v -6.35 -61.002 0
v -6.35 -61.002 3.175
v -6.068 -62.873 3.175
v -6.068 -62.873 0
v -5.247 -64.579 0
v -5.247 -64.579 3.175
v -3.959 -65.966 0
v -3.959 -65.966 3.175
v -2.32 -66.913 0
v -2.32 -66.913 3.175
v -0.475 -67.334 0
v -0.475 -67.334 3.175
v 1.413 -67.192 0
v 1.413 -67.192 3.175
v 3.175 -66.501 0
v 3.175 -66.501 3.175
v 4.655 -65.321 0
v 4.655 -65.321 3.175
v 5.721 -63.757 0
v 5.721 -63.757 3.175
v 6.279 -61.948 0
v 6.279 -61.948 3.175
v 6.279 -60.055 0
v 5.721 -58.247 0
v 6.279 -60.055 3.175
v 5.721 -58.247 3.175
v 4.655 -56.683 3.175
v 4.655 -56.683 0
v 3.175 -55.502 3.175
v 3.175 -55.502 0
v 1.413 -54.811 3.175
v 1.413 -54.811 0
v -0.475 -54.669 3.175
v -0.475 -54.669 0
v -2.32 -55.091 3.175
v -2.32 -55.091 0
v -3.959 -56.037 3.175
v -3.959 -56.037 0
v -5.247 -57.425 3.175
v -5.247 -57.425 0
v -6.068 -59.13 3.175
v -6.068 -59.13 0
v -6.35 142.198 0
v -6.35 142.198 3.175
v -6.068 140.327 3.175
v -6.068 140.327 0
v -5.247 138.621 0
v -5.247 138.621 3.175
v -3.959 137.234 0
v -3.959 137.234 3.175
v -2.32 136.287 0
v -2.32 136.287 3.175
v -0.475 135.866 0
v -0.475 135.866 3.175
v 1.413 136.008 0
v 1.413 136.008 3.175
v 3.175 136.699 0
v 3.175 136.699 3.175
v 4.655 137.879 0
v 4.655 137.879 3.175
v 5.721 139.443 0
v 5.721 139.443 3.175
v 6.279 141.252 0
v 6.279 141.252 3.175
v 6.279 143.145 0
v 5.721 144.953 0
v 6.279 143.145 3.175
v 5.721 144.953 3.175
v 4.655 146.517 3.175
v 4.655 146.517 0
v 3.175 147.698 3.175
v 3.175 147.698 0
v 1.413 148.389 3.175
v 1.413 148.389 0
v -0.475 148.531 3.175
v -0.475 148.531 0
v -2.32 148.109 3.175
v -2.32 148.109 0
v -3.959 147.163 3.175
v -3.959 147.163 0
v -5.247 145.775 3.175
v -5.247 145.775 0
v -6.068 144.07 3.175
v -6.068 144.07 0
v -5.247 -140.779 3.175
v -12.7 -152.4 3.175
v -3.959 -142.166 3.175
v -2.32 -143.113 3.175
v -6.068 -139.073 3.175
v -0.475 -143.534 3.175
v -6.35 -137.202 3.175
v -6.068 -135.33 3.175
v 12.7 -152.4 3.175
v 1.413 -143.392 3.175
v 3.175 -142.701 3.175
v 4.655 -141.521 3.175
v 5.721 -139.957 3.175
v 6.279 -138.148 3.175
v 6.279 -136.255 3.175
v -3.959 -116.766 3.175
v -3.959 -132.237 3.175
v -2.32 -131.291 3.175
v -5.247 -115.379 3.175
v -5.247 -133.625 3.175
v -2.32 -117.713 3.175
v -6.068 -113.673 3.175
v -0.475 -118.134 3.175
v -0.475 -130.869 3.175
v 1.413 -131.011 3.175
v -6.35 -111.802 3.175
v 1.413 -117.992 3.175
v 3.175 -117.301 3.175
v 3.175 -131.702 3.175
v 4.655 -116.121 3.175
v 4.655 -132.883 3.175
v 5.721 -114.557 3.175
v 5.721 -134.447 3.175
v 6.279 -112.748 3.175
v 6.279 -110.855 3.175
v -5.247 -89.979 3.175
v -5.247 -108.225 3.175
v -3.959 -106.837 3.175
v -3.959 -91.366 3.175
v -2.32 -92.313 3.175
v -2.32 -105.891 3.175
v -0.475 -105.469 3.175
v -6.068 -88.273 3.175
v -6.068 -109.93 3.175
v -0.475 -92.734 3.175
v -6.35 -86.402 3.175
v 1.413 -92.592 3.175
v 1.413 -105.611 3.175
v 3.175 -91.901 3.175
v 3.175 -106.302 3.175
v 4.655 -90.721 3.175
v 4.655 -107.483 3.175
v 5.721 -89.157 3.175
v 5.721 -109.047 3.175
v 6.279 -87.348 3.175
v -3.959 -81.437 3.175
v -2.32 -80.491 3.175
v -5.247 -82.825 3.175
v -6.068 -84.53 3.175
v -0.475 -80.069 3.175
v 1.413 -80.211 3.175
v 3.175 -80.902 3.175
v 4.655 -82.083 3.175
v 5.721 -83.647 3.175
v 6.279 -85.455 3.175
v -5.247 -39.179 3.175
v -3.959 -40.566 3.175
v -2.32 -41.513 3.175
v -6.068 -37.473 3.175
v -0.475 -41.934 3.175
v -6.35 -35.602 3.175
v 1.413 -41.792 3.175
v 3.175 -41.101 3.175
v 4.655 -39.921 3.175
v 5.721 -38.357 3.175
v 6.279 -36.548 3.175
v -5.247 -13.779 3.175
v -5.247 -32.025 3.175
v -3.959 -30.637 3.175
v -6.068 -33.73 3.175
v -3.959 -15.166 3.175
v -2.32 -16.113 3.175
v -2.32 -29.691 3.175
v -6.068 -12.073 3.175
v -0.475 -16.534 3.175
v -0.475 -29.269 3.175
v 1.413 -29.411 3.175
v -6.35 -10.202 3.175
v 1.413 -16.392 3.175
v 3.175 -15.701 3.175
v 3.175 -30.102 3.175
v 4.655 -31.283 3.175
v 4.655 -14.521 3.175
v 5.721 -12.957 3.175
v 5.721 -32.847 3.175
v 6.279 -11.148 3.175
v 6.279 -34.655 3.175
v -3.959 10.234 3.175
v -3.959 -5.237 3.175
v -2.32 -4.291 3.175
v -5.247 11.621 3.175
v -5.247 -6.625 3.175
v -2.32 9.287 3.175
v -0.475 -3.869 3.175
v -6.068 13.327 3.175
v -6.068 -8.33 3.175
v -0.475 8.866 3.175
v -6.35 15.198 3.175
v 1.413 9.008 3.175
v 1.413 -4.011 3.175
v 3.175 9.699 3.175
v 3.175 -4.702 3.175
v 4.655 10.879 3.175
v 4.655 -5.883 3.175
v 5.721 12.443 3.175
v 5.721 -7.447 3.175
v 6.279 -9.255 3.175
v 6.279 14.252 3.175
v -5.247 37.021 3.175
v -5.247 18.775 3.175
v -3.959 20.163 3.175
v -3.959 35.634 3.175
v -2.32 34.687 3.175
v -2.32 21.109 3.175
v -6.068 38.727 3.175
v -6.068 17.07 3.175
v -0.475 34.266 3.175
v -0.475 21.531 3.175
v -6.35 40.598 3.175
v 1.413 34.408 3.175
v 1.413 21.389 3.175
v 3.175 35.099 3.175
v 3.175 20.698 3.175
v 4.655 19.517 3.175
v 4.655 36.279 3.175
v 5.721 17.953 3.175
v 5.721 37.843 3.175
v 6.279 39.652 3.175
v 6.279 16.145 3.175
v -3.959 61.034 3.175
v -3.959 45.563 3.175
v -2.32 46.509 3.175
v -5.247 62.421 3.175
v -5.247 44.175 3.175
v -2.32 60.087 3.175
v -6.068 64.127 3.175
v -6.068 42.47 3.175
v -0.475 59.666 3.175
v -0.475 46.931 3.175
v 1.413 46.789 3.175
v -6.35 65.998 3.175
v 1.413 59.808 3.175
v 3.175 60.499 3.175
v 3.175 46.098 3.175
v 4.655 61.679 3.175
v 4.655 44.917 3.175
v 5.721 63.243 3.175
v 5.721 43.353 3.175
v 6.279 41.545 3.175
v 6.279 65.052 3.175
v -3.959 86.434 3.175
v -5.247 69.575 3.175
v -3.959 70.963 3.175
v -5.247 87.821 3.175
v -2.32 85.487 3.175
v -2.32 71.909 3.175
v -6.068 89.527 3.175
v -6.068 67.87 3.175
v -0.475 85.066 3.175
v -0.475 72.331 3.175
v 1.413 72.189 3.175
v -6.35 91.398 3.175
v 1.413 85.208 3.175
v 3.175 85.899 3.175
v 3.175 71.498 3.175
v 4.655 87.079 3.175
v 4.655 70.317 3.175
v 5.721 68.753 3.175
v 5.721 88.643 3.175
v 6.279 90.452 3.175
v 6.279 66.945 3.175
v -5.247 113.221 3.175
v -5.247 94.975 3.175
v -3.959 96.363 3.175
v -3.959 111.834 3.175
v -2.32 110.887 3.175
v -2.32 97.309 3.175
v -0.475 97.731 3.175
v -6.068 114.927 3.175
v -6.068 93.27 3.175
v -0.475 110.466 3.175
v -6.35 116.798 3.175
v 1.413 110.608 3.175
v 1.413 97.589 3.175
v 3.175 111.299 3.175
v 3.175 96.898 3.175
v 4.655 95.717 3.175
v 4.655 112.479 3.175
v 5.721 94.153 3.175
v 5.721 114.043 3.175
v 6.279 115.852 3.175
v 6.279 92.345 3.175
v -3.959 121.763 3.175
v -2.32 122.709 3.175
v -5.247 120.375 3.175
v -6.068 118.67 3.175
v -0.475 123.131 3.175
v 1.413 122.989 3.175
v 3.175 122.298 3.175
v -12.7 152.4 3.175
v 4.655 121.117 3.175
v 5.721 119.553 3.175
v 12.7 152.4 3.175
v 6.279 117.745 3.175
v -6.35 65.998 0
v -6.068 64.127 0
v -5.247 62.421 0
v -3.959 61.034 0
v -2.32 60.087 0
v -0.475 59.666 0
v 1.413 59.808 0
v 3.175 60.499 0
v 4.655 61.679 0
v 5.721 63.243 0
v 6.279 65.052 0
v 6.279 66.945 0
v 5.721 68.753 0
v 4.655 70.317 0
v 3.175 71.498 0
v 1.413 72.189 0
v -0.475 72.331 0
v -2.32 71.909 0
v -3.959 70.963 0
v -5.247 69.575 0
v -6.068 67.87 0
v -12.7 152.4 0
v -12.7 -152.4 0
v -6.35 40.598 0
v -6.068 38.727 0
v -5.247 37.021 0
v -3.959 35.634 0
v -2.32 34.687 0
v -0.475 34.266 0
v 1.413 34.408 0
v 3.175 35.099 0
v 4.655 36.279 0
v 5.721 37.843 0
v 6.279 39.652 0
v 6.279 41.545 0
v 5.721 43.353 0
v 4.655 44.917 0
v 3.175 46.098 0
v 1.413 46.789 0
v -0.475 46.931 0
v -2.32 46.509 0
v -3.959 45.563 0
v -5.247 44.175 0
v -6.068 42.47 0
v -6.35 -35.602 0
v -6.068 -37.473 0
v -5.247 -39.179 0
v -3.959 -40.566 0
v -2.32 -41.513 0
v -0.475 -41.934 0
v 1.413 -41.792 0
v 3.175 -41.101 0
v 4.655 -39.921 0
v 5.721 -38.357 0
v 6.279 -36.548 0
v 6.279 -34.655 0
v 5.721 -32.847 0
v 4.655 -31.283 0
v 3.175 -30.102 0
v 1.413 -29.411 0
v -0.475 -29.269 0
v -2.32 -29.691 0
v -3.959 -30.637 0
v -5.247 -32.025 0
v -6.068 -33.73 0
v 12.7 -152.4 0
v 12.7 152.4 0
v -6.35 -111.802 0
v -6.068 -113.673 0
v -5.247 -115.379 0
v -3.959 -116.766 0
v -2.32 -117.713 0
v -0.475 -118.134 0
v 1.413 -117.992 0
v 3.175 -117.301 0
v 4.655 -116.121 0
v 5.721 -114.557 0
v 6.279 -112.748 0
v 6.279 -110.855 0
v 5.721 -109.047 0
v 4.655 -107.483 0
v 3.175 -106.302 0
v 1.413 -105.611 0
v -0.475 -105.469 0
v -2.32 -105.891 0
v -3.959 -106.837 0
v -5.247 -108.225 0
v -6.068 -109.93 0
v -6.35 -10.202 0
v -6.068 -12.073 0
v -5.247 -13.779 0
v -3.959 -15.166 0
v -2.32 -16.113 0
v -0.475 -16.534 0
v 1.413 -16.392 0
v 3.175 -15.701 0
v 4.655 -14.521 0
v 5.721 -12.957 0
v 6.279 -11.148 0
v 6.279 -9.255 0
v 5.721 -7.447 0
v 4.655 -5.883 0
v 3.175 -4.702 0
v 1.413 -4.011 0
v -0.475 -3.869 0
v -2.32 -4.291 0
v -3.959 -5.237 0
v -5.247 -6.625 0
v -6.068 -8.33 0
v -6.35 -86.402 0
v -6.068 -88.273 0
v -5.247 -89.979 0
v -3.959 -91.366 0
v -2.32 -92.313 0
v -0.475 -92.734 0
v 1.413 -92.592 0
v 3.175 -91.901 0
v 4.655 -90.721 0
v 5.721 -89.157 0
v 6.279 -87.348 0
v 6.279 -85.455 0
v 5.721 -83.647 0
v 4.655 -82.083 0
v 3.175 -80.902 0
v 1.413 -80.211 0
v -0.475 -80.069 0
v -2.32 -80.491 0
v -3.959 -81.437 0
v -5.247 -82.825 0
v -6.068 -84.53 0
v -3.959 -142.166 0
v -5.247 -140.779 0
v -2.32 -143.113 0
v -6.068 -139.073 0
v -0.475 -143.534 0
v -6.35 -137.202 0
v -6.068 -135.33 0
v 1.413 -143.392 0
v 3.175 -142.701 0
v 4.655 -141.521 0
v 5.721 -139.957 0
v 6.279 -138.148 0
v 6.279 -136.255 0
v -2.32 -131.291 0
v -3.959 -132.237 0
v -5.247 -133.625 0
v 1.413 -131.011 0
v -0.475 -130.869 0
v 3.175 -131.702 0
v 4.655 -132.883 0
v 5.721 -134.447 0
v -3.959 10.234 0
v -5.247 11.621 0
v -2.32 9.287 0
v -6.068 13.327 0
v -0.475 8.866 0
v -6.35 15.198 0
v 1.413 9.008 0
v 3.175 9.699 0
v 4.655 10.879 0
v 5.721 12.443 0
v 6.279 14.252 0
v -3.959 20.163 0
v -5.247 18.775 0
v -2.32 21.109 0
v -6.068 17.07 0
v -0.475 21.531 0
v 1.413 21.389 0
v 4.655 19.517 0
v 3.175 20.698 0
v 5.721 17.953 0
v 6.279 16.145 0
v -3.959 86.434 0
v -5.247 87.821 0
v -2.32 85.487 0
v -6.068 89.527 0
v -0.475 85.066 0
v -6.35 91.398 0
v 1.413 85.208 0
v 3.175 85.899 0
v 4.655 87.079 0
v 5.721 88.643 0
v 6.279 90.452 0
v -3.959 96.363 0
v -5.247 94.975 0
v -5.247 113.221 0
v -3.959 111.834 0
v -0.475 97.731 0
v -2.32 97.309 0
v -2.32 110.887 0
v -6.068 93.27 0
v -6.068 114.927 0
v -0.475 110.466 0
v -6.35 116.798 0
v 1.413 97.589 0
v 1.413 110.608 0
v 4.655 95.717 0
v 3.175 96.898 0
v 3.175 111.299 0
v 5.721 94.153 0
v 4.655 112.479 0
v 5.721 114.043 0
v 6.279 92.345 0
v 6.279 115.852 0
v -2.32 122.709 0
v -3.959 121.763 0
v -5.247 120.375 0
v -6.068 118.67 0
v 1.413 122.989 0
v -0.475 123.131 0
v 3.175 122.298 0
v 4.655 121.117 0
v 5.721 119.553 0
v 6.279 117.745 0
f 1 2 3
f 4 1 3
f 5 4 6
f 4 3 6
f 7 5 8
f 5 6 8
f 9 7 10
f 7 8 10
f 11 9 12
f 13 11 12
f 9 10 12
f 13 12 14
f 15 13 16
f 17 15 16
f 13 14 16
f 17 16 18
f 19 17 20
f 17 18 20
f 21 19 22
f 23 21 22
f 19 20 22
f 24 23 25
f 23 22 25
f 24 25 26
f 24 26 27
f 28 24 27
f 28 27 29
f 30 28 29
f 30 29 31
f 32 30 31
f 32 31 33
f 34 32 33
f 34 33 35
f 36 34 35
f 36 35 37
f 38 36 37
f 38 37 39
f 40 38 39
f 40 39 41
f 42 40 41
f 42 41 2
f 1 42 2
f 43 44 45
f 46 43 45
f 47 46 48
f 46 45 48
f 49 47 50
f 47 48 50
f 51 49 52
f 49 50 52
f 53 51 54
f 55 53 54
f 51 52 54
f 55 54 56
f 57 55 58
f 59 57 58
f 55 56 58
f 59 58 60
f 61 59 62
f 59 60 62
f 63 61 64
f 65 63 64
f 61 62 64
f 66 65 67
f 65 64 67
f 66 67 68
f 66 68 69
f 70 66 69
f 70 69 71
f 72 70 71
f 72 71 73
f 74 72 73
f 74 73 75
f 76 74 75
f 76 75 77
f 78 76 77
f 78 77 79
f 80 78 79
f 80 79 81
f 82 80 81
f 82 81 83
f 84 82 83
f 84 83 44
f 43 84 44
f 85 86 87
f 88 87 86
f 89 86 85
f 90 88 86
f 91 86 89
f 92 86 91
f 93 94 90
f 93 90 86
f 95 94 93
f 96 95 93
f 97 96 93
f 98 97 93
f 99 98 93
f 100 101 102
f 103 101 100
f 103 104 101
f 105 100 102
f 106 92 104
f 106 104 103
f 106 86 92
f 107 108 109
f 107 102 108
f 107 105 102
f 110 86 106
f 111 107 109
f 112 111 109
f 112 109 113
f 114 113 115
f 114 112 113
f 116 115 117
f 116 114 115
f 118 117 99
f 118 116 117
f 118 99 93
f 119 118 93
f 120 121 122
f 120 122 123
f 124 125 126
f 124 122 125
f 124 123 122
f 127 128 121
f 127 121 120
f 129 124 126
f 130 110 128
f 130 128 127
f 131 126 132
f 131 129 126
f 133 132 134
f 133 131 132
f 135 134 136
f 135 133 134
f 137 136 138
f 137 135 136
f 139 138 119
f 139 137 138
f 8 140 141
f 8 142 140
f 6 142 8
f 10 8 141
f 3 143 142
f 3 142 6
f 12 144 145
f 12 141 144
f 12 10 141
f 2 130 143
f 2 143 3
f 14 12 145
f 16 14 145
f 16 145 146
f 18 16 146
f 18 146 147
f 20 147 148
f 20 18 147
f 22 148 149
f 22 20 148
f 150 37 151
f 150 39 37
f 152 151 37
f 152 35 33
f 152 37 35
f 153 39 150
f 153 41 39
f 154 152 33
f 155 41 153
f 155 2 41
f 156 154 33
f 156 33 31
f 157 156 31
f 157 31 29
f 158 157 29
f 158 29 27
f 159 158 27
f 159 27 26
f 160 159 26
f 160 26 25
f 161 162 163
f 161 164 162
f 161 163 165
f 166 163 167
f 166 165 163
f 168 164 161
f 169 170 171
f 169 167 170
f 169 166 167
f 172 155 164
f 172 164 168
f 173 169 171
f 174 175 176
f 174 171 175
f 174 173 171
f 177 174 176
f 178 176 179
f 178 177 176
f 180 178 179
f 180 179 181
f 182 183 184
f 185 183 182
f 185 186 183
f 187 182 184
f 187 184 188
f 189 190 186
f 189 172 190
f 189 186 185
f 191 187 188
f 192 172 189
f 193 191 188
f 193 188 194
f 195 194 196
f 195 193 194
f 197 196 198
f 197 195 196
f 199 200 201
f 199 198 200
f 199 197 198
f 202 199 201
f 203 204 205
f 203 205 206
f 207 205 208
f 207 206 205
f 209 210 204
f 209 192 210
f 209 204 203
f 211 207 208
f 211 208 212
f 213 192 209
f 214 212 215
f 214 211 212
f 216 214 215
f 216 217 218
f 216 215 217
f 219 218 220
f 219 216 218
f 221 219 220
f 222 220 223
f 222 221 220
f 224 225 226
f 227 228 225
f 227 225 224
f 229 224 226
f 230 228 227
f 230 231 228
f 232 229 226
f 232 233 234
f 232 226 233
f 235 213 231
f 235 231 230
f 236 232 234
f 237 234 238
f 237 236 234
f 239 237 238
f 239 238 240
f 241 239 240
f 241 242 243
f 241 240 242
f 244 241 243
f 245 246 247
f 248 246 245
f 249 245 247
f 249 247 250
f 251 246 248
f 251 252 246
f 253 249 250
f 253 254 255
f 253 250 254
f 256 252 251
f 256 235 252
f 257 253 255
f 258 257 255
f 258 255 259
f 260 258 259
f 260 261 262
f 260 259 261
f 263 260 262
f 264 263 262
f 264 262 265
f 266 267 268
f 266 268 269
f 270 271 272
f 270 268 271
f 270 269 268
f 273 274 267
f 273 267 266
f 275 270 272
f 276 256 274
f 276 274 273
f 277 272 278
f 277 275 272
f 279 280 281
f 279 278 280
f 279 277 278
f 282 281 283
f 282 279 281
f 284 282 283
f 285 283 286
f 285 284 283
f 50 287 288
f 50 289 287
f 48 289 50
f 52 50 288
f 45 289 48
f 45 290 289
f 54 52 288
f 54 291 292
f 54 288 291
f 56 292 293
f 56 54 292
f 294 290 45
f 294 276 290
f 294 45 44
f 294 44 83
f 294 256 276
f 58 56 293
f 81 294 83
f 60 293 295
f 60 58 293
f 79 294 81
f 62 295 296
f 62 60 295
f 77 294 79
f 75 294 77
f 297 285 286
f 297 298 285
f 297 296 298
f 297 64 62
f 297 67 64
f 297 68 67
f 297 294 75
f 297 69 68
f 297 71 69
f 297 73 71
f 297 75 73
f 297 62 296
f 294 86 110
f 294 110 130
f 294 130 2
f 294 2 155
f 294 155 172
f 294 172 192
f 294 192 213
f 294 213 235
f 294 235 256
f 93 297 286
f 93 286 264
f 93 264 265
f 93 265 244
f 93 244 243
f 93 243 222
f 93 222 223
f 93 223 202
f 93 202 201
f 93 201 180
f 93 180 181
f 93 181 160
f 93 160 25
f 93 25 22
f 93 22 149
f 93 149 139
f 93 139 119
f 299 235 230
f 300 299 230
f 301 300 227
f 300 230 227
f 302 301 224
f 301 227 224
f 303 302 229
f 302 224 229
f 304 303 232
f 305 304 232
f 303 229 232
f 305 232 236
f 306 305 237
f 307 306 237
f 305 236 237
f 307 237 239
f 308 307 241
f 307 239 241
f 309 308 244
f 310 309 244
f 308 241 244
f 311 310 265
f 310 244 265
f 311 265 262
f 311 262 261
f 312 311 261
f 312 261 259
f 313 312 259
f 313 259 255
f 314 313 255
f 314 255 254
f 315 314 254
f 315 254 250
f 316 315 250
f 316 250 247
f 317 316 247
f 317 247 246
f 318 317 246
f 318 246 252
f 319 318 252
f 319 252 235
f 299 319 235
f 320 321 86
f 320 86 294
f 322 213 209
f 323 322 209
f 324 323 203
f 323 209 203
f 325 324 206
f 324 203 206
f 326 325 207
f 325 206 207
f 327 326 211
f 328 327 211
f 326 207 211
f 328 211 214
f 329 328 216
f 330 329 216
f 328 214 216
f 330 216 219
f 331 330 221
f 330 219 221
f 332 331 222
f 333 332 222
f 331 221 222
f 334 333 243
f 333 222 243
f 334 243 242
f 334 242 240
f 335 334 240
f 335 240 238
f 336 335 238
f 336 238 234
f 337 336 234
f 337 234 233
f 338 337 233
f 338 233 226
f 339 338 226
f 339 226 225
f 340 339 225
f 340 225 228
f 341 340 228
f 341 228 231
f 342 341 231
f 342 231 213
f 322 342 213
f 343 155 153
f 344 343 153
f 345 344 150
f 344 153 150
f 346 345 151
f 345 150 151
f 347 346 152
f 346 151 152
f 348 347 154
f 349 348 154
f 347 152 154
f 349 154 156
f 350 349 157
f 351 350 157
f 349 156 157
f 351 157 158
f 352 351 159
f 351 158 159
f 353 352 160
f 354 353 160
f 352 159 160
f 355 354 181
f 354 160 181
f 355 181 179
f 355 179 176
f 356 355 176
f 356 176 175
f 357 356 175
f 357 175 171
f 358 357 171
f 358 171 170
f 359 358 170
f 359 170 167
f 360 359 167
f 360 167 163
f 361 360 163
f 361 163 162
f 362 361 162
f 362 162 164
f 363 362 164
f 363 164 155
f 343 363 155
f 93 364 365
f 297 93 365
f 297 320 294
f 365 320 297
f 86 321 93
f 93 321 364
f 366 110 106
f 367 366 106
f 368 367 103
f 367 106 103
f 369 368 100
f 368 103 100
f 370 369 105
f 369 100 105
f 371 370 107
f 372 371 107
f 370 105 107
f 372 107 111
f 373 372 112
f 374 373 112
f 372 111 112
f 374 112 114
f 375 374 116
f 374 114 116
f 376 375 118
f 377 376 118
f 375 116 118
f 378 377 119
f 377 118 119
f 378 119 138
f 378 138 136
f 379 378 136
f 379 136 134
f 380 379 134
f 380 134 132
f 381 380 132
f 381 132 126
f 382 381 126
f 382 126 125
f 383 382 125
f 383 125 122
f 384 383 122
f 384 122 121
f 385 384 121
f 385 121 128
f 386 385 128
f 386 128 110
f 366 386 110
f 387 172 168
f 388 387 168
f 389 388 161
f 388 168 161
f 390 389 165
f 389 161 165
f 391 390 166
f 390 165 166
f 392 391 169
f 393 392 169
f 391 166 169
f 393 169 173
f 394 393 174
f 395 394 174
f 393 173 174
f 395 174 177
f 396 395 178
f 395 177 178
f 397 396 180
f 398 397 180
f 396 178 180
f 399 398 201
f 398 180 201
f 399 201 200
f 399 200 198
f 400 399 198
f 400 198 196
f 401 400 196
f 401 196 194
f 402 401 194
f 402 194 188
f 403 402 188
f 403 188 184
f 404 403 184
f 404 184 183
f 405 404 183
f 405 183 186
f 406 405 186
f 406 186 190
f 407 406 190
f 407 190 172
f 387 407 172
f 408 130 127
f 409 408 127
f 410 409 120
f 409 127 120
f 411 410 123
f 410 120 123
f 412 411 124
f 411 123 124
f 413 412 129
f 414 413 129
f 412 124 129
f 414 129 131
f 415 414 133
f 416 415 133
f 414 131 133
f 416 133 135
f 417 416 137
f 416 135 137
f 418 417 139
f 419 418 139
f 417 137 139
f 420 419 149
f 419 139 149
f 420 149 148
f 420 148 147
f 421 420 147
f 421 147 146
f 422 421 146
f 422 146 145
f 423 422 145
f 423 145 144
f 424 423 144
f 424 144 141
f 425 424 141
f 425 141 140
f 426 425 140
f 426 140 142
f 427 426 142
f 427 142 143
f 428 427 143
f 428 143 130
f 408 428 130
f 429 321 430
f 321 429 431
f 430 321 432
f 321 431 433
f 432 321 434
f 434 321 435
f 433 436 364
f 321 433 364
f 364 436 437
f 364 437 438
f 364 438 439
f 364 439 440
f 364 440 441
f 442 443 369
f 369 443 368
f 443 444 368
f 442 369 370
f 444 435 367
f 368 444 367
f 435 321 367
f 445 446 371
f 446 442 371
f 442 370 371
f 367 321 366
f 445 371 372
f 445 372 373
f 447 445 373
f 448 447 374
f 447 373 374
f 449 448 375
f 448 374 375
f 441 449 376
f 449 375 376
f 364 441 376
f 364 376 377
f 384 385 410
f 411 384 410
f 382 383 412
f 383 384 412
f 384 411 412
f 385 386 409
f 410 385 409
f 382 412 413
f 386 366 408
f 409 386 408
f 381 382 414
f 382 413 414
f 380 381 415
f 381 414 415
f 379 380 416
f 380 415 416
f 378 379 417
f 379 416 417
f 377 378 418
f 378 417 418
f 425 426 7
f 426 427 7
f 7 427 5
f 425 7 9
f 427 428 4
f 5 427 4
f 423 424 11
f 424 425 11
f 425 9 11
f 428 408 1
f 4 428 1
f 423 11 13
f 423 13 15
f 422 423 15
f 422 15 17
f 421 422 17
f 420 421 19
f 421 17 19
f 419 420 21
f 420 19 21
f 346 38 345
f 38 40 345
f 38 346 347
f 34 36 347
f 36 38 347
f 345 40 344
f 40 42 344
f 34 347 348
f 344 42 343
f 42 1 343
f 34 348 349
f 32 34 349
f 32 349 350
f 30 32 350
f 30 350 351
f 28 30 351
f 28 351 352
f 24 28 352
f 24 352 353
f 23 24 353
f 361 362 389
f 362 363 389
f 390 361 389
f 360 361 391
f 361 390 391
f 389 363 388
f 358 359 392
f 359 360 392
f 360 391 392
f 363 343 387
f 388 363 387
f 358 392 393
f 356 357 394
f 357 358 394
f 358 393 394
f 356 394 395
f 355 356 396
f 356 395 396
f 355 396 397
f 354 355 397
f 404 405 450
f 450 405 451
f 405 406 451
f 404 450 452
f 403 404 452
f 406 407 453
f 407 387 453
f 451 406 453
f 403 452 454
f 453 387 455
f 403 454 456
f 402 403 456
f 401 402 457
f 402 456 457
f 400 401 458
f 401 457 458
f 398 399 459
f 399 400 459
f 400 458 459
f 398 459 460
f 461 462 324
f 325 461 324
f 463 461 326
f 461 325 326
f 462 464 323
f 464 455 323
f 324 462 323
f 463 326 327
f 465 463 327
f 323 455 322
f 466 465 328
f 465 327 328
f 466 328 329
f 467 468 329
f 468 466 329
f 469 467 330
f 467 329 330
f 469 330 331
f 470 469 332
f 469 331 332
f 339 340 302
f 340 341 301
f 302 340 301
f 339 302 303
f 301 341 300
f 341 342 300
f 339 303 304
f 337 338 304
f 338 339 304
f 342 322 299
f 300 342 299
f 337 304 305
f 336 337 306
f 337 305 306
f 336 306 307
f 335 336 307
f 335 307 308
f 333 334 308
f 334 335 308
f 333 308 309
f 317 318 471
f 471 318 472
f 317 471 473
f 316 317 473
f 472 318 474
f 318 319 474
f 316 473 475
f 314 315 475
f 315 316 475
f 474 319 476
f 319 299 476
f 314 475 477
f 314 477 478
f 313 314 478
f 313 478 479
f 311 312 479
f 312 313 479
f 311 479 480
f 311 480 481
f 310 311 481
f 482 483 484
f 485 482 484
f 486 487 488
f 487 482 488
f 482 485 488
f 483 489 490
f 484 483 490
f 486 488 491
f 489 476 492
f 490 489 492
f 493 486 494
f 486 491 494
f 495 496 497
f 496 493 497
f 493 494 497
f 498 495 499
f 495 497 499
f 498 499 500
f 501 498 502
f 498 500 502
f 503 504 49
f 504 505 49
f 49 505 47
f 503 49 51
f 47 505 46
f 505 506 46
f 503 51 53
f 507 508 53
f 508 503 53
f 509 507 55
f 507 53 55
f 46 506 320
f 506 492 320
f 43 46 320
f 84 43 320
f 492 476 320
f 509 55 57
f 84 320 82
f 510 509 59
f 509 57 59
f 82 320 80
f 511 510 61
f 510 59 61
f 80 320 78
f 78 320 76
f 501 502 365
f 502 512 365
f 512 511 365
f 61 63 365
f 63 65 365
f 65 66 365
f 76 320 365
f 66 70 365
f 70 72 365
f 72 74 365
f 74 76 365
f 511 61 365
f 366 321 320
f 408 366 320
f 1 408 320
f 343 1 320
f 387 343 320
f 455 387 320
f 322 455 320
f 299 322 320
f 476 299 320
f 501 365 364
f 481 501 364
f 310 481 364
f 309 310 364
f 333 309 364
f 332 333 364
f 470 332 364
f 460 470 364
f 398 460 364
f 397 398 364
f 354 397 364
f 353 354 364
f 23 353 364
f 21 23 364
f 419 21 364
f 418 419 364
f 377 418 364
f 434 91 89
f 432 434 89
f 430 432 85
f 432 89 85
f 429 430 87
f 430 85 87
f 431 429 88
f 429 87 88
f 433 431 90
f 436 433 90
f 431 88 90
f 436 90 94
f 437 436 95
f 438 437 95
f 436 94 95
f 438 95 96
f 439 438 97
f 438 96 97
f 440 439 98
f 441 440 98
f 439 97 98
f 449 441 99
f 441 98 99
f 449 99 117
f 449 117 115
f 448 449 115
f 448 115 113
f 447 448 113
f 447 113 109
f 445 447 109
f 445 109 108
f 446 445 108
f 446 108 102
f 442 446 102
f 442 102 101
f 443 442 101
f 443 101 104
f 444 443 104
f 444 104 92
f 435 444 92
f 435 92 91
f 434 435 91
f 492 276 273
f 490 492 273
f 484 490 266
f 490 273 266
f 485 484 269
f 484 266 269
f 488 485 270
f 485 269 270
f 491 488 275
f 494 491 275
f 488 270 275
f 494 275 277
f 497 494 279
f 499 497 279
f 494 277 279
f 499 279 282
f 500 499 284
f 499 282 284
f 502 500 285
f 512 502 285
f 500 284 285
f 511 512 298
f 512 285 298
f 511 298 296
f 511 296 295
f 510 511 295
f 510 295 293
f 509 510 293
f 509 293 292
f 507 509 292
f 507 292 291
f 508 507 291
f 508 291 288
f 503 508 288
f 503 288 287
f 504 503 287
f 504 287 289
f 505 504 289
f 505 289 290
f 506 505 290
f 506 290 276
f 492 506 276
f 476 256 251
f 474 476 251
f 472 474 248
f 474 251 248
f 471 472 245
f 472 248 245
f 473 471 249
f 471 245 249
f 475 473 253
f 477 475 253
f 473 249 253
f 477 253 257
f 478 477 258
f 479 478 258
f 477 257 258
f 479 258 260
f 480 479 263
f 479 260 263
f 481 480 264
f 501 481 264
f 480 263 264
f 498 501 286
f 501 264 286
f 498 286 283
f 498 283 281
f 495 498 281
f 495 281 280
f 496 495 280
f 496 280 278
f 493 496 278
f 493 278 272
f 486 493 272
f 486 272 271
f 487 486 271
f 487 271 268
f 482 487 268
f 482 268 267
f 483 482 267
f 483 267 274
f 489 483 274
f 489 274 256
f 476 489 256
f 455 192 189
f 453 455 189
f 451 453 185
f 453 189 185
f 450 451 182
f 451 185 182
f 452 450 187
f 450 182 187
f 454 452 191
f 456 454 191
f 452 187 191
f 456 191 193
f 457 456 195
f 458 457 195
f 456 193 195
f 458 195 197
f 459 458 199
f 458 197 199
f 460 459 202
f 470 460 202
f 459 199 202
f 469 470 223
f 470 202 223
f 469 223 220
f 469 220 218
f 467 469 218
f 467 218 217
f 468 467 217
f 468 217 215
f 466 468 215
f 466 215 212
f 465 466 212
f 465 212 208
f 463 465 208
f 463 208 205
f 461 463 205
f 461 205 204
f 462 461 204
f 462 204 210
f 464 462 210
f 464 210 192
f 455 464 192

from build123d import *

# Parameters (mm, degrees)
F0_W     = 25.4
F0_H     = 304.8
F1_DEPTH = 3.175
F3_D     = 12.7
F3_DEPTH = 25.4
F3_TIP   = 3.8154649308
F4_D     = 12.7
F4_DEPTH = 25.4
F4_TIP   = 3.8154649308
F5_D     = 12.7
F5_DEPTH = 25.4
F5_TIP   = 3.8154649308
F6_D     = 12.7
F6_DEPTH = 25.4
F6_TIP   = 3.8154649308
F7_D     = 12.7
F7_DEPTH = 25.4
F7_TIP   = 3.8154649308


with BuildPart() as f1:
    # F0 (on Top) → F1 (new body)
    with BuildSketch(Plane.XY):
        Rectangle(F0_W, F0_H)
    extrude(amount=F1_DEPTH)

    # F3
    with Locations(Plane(origin=(0, 0, 0), x_dir=(1, 0, 0), z_dir=(0, 0, -1))):
        with Locations((0, 137.2016693357)):
            Hole(F3_D / 2, depth=F3_DEPTH)
            with Locations((0, 0, -(F3_DEPTH + F3_TIP / 2))):  # 118° drill point
                Cone(0, F3_D / 2, F3_TIP, mode=Mode.SUBTRACT)

    # F4
    with Locations(Plane(origin=(0, 0, 0), x_dir=(1, 0, 0), z_dir=(0, 0, -1))):
        with Locations((0, 111.8016693357)):
            Hole(F4_D / 2, depth=F4_DEPTH)
            with Locations((0, 0, -(F4_DEPTH + F4_TIP / 2))):  # 118° drill point
                Cone(0, F4_D / 2, F4_TIP, mode=Mode.SUBTRACT)

    # F5
    with Locations(Plane(origin=(0, 0, 0), x_dir=(1, 0, 0), z_dir=(0, 0, -1))):
        with Locations((0, 86.4016693357)):
            Hole(F5_D / 2, depth=F5_DEPTH)
            with Locations((0, 0, -(F5_DEPTH + F5_TIP / 2))):  # 118° drill point
                Cone(0, F5_D / 2, F5_TIP, mode=Mode.SUBTRACT)

    # F6
    with Locations(Plane(origin=(0, 0, 0), x_dir=(1, 0, 0), z_dir=(0, 0, -1))):
        with Locations((0, 61.0016693357)):
            Hole(F6_D / 2, depth=F6_DEPTH)
            with Locations((0, 0, -(F6_DEPTH + F6_TIP / 2))):  # 118° drill point
                Cone(0, F6_D / 2, F6_TIP, mode=Mode.SUBTRACT)

    # F7
    with Locations(Plane(origin=(0, 0, 0), x_dir=(1, 0, 0), z_dir=(0, 0, -1))):
        with Locations((0, 35.6016693357), (0, 10.2016693357), (0, -15.1983306643), (0, -40.5983306643), (0, -65.9983306643), (0, -91.3983306643), (0, -116.7983306643), (0, -142.1983306643)):
            Hole(F7_D / 2, depth=F7_DEPTH)
            with Locations((0, 0, -(F7_DEPTH + F7_TIP / 2))):  # 118° drill point
                Cone(0, F7_D / 2, F7_TIP, mode=Mode.SUBTRACT)


solid = f1.part
